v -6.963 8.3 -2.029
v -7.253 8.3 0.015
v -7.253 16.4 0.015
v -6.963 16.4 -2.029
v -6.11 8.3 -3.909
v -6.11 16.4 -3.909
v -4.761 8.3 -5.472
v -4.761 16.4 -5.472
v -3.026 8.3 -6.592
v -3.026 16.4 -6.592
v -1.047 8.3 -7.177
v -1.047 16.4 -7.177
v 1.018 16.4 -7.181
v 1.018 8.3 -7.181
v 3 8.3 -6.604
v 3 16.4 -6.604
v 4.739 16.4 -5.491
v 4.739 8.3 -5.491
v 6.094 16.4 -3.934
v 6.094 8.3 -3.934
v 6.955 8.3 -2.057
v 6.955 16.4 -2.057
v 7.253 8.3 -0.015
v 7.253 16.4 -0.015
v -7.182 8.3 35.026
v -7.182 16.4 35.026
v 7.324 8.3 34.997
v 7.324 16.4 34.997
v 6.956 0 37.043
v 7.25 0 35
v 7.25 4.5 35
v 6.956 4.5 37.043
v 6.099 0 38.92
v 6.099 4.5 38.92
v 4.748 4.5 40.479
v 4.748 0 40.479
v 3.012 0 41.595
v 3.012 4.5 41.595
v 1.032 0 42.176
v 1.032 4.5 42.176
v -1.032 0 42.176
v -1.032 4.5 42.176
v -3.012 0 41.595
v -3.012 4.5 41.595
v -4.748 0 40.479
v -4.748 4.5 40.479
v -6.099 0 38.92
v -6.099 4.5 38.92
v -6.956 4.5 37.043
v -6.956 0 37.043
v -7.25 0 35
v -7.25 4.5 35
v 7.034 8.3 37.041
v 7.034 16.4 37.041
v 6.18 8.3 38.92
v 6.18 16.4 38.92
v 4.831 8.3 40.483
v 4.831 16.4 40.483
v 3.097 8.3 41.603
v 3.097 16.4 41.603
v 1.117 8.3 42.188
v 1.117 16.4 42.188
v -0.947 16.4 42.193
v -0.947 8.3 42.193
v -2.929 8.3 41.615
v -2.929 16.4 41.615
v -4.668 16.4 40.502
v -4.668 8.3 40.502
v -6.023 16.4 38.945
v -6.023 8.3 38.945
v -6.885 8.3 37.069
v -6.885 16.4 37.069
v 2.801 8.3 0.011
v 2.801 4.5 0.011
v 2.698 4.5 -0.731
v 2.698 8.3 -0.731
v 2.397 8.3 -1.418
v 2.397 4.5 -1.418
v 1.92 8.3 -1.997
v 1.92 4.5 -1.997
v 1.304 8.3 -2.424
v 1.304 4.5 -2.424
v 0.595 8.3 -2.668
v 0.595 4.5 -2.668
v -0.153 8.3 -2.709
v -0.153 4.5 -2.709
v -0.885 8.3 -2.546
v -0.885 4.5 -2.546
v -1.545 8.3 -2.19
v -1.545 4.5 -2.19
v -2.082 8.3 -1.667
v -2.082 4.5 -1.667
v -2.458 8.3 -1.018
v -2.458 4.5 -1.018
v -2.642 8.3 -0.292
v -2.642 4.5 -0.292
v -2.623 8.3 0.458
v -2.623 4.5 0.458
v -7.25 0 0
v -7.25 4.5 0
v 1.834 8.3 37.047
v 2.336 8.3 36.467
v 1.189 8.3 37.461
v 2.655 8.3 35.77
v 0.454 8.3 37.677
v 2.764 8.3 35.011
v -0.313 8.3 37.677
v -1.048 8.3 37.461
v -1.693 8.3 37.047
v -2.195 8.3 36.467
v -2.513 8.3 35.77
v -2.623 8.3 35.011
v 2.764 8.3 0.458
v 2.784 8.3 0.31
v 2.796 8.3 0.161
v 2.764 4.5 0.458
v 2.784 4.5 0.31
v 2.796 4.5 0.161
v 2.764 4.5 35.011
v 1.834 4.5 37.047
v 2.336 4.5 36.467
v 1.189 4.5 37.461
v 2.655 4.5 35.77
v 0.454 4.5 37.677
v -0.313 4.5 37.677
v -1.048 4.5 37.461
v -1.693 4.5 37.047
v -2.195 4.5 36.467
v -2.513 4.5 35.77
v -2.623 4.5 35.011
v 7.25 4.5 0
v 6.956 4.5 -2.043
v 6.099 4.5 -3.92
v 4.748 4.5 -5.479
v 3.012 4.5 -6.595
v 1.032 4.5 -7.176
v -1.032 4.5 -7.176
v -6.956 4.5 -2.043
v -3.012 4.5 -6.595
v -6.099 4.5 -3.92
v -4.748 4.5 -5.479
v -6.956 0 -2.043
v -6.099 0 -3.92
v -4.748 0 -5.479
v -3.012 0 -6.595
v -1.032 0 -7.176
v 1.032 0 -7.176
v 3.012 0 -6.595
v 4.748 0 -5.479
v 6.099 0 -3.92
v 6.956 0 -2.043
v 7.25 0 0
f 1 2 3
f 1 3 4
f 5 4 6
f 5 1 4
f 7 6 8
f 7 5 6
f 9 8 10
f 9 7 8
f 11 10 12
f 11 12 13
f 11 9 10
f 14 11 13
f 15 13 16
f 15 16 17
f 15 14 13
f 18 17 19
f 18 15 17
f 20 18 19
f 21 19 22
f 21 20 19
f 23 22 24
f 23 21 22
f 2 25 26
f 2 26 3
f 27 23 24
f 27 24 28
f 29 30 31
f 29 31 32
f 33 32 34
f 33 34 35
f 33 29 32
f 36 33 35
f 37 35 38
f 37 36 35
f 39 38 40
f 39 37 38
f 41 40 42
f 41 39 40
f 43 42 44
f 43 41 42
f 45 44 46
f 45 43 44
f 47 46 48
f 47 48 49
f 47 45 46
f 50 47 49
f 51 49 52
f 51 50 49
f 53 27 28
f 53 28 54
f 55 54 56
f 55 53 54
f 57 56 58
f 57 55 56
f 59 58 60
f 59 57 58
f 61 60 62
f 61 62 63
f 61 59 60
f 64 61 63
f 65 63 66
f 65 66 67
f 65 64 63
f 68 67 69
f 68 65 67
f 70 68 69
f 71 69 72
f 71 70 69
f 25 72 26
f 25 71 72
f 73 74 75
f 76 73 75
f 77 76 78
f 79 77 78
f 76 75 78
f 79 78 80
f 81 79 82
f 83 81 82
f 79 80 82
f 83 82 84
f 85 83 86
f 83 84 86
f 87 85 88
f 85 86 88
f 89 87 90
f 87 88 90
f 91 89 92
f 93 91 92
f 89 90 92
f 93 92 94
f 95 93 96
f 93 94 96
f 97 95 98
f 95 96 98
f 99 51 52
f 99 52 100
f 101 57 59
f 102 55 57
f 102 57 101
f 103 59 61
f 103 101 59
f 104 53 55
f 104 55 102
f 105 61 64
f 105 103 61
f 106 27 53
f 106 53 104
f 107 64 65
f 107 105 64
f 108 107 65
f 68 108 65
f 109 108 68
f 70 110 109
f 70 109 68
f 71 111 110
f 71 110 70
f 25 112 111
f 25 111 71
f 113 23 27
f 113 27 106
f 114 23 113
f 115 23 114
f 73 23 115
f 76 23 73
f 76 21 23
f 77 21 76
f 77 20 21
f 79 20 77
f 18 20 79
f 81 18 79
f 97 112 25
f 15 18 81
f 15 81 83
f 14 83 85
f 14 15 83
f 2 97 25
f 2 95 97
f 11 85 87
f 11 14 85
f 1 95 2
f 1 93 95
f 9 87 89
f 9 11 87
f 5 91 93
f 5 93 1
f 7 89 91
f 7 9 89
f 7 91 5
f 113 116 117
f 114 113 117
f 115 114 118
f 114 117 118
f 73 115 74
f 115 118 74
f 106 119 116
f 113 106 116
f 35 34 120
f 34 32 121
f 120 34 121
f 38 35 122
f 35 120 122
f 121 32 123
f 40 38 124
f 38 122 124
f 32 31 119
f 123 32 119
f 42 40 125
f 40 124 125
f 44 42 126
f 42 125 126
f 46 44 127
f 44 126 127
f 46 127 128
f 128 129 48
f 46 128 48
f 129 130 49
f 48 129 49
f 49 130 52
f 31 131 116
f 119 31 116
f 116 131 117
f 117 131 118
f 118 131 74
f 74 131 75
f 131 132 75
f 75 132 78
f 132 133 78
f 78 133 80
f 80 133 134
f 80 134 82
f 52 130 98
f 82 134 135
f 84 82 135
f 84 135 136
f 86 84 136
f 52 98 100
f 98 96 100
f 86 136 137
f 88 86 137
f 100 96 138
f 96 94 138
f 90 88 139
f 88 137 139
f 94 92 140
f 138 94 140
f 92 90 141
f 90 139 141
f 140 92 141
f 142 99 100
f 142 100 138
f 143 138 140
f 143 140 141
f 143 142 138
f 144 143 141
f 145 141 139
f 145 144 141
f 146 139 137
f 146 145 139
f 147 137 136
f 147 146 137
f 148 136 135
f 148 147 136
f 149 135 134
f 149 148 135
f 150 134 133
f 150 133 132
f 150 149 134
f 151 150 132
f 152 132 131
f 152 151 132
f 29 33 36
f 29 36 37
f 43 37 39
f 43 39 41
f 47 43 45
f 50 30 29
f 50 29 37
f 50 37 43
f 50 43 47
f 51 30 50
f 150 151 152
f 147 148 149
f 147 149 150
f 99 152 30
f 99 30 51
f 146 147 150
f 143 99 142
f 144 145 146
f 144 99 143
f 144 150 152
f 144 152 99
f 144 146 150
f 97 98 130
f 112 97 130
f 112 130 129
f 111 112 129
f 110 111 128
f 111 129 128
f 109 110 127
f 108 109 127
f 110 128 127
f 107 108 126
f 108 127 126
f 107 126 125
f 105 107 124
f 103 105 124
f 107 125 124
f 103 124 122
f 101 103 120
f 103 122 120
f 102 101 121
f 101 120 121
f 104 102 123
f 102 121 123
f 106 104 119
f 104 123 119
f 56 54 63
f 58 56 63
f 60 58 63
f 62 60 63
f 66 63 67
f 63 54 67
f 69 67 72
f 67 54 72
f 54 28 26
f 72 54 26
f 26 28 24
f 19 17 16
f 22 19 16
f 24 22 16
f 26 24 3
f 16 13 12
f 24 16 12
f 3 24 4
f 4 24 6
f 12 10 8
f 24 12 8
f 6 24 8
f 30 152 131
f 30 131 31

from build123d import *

# Parameters (mm, degrees)
BOSS_EXTRUDE1_DEPTH = 4.5
BOSS_EXTRUDE2_DEPTH = 3.8
BOSS_EXTRUDE3_DEPTH = 8.1


with BuildPart() as part:
    # Sketch1 → Boss-Extrude1 (new body)
    with BuildSketch(Plane(origin=(0, 0, 0), x_dir=(1, 0, 0), z_dir=(0, 1, 0))):
        with BuildLine():
            Line((7.25, 0), (7.25, -35))
            ThreePointArc((7.25, -35), (0, -42.25), (-7.25, -35))
            Line((-7.25, -35), (-7.25, 0))
            ThreePointArc((-7.25, 0), (0, 7.25), (7.25, 0))
        make_face()
    extrude(amount=BOSS_EXTRUDE1_DEPTH)

    # Sketch3 → Boss-Extrude2 (add)
    with BuildSketch(Plane(origin=(0, 4.5, 0), x_dir=(1, 0, 0), z_dir=(0, 1, 0))):
        with BuildLine():
            Line((-2.622571491, -0.457666807), (-2.622571491, -0.011296081))
            Line((-2.622571491, -0.011296081), (2.763792269, -0.011296081))
            Line((2.763792269, -0.011296081), (2.763792269, -0.457666807))
            ThreePointArc((2.763792269, -0.457666807), (2.791332039, -0.235236185), (2.800532634, -0.011296081))
            ThreePointArc((2.800532634, -0.011296081), (-0.153329714, 2.709425568), (-2.622571491, -0.457666807))
        make_face()
        with BuildLine():
            Line((2.763792269, -0.011296081), (-2.622571491, -0.011296081))
            Line((-2.622571491, -0.011296081), (-2.622571491, -0.457666807))
            ThreePointArc((-2.622571491, -0.457666807), (0.070610389, -2.741218326), (2.763792269, -0.457666807))
            Line((2.763792269, -0.457666807), (2.763792269, -0.011296081))
        make_face()
        with BuildLine():
            ThreePointArc((2.763792269, -0.457666807), (0.070610389, -2.741218326), (-2.622571491, -0.457666807))
            Line((-2.622571491, -0.457666807), (-2.622571491, -35.011296081))
            ThreePointArc((-2.622571491, -35.011296081), (0.070610389, -32.318114201), (2.763792269, -35.011296081))
            Line((2.763792269, -35.011296081), (2.763792269, -0.457666807))
        make_face()
        with BuildLine():
            ThreePointArc((2.763792269, -35.011296081), (0.070610389, -32.318114201), (-2.622571491, -35.011296081))
            Line((-2.622571491, -35.011296081), (2.763792269, -35.011296081))
        make_face()
        with BuildLine():
            Line((2.763792269, -35.011296081), (-2.622571491, -35.011296081))
            ThreePointArc((-2.622571491, -35.011296081), (0.070610389, -37.704477961), (2.763792269, -35.011296081))
        make_face()
    extrude(amount=BOSS_EXTRUDE2_DEPTH)

    # Sketch4 → Boss-Extrude3 (add)
    with BuildSketch(Plane(origin=(0, 8.3, 0), x_dir=(1, 0, 0), z_dir=(0, 1, 0))):
        with BuildLine():
            Line((7.25308141, 0.014627933), (7.323691799, -34.996668148))
            ThreePointArc((7.323691799, -34.996668148), (0.085238322, -42.264377491), (-7.182471021, -35.025924014))
            Line((-7.182471021, -35.025924014), (-7.25308141, -0.014627933))
            ThreePointArc((-7.25308141, -0.014627933), (-0.014627933, 7.25308141), (7.25308141, 0.014627933))
        make_face()
    extrude(amount=BOSS_EXTRUDE3_DEPTH)


solid = part.part
